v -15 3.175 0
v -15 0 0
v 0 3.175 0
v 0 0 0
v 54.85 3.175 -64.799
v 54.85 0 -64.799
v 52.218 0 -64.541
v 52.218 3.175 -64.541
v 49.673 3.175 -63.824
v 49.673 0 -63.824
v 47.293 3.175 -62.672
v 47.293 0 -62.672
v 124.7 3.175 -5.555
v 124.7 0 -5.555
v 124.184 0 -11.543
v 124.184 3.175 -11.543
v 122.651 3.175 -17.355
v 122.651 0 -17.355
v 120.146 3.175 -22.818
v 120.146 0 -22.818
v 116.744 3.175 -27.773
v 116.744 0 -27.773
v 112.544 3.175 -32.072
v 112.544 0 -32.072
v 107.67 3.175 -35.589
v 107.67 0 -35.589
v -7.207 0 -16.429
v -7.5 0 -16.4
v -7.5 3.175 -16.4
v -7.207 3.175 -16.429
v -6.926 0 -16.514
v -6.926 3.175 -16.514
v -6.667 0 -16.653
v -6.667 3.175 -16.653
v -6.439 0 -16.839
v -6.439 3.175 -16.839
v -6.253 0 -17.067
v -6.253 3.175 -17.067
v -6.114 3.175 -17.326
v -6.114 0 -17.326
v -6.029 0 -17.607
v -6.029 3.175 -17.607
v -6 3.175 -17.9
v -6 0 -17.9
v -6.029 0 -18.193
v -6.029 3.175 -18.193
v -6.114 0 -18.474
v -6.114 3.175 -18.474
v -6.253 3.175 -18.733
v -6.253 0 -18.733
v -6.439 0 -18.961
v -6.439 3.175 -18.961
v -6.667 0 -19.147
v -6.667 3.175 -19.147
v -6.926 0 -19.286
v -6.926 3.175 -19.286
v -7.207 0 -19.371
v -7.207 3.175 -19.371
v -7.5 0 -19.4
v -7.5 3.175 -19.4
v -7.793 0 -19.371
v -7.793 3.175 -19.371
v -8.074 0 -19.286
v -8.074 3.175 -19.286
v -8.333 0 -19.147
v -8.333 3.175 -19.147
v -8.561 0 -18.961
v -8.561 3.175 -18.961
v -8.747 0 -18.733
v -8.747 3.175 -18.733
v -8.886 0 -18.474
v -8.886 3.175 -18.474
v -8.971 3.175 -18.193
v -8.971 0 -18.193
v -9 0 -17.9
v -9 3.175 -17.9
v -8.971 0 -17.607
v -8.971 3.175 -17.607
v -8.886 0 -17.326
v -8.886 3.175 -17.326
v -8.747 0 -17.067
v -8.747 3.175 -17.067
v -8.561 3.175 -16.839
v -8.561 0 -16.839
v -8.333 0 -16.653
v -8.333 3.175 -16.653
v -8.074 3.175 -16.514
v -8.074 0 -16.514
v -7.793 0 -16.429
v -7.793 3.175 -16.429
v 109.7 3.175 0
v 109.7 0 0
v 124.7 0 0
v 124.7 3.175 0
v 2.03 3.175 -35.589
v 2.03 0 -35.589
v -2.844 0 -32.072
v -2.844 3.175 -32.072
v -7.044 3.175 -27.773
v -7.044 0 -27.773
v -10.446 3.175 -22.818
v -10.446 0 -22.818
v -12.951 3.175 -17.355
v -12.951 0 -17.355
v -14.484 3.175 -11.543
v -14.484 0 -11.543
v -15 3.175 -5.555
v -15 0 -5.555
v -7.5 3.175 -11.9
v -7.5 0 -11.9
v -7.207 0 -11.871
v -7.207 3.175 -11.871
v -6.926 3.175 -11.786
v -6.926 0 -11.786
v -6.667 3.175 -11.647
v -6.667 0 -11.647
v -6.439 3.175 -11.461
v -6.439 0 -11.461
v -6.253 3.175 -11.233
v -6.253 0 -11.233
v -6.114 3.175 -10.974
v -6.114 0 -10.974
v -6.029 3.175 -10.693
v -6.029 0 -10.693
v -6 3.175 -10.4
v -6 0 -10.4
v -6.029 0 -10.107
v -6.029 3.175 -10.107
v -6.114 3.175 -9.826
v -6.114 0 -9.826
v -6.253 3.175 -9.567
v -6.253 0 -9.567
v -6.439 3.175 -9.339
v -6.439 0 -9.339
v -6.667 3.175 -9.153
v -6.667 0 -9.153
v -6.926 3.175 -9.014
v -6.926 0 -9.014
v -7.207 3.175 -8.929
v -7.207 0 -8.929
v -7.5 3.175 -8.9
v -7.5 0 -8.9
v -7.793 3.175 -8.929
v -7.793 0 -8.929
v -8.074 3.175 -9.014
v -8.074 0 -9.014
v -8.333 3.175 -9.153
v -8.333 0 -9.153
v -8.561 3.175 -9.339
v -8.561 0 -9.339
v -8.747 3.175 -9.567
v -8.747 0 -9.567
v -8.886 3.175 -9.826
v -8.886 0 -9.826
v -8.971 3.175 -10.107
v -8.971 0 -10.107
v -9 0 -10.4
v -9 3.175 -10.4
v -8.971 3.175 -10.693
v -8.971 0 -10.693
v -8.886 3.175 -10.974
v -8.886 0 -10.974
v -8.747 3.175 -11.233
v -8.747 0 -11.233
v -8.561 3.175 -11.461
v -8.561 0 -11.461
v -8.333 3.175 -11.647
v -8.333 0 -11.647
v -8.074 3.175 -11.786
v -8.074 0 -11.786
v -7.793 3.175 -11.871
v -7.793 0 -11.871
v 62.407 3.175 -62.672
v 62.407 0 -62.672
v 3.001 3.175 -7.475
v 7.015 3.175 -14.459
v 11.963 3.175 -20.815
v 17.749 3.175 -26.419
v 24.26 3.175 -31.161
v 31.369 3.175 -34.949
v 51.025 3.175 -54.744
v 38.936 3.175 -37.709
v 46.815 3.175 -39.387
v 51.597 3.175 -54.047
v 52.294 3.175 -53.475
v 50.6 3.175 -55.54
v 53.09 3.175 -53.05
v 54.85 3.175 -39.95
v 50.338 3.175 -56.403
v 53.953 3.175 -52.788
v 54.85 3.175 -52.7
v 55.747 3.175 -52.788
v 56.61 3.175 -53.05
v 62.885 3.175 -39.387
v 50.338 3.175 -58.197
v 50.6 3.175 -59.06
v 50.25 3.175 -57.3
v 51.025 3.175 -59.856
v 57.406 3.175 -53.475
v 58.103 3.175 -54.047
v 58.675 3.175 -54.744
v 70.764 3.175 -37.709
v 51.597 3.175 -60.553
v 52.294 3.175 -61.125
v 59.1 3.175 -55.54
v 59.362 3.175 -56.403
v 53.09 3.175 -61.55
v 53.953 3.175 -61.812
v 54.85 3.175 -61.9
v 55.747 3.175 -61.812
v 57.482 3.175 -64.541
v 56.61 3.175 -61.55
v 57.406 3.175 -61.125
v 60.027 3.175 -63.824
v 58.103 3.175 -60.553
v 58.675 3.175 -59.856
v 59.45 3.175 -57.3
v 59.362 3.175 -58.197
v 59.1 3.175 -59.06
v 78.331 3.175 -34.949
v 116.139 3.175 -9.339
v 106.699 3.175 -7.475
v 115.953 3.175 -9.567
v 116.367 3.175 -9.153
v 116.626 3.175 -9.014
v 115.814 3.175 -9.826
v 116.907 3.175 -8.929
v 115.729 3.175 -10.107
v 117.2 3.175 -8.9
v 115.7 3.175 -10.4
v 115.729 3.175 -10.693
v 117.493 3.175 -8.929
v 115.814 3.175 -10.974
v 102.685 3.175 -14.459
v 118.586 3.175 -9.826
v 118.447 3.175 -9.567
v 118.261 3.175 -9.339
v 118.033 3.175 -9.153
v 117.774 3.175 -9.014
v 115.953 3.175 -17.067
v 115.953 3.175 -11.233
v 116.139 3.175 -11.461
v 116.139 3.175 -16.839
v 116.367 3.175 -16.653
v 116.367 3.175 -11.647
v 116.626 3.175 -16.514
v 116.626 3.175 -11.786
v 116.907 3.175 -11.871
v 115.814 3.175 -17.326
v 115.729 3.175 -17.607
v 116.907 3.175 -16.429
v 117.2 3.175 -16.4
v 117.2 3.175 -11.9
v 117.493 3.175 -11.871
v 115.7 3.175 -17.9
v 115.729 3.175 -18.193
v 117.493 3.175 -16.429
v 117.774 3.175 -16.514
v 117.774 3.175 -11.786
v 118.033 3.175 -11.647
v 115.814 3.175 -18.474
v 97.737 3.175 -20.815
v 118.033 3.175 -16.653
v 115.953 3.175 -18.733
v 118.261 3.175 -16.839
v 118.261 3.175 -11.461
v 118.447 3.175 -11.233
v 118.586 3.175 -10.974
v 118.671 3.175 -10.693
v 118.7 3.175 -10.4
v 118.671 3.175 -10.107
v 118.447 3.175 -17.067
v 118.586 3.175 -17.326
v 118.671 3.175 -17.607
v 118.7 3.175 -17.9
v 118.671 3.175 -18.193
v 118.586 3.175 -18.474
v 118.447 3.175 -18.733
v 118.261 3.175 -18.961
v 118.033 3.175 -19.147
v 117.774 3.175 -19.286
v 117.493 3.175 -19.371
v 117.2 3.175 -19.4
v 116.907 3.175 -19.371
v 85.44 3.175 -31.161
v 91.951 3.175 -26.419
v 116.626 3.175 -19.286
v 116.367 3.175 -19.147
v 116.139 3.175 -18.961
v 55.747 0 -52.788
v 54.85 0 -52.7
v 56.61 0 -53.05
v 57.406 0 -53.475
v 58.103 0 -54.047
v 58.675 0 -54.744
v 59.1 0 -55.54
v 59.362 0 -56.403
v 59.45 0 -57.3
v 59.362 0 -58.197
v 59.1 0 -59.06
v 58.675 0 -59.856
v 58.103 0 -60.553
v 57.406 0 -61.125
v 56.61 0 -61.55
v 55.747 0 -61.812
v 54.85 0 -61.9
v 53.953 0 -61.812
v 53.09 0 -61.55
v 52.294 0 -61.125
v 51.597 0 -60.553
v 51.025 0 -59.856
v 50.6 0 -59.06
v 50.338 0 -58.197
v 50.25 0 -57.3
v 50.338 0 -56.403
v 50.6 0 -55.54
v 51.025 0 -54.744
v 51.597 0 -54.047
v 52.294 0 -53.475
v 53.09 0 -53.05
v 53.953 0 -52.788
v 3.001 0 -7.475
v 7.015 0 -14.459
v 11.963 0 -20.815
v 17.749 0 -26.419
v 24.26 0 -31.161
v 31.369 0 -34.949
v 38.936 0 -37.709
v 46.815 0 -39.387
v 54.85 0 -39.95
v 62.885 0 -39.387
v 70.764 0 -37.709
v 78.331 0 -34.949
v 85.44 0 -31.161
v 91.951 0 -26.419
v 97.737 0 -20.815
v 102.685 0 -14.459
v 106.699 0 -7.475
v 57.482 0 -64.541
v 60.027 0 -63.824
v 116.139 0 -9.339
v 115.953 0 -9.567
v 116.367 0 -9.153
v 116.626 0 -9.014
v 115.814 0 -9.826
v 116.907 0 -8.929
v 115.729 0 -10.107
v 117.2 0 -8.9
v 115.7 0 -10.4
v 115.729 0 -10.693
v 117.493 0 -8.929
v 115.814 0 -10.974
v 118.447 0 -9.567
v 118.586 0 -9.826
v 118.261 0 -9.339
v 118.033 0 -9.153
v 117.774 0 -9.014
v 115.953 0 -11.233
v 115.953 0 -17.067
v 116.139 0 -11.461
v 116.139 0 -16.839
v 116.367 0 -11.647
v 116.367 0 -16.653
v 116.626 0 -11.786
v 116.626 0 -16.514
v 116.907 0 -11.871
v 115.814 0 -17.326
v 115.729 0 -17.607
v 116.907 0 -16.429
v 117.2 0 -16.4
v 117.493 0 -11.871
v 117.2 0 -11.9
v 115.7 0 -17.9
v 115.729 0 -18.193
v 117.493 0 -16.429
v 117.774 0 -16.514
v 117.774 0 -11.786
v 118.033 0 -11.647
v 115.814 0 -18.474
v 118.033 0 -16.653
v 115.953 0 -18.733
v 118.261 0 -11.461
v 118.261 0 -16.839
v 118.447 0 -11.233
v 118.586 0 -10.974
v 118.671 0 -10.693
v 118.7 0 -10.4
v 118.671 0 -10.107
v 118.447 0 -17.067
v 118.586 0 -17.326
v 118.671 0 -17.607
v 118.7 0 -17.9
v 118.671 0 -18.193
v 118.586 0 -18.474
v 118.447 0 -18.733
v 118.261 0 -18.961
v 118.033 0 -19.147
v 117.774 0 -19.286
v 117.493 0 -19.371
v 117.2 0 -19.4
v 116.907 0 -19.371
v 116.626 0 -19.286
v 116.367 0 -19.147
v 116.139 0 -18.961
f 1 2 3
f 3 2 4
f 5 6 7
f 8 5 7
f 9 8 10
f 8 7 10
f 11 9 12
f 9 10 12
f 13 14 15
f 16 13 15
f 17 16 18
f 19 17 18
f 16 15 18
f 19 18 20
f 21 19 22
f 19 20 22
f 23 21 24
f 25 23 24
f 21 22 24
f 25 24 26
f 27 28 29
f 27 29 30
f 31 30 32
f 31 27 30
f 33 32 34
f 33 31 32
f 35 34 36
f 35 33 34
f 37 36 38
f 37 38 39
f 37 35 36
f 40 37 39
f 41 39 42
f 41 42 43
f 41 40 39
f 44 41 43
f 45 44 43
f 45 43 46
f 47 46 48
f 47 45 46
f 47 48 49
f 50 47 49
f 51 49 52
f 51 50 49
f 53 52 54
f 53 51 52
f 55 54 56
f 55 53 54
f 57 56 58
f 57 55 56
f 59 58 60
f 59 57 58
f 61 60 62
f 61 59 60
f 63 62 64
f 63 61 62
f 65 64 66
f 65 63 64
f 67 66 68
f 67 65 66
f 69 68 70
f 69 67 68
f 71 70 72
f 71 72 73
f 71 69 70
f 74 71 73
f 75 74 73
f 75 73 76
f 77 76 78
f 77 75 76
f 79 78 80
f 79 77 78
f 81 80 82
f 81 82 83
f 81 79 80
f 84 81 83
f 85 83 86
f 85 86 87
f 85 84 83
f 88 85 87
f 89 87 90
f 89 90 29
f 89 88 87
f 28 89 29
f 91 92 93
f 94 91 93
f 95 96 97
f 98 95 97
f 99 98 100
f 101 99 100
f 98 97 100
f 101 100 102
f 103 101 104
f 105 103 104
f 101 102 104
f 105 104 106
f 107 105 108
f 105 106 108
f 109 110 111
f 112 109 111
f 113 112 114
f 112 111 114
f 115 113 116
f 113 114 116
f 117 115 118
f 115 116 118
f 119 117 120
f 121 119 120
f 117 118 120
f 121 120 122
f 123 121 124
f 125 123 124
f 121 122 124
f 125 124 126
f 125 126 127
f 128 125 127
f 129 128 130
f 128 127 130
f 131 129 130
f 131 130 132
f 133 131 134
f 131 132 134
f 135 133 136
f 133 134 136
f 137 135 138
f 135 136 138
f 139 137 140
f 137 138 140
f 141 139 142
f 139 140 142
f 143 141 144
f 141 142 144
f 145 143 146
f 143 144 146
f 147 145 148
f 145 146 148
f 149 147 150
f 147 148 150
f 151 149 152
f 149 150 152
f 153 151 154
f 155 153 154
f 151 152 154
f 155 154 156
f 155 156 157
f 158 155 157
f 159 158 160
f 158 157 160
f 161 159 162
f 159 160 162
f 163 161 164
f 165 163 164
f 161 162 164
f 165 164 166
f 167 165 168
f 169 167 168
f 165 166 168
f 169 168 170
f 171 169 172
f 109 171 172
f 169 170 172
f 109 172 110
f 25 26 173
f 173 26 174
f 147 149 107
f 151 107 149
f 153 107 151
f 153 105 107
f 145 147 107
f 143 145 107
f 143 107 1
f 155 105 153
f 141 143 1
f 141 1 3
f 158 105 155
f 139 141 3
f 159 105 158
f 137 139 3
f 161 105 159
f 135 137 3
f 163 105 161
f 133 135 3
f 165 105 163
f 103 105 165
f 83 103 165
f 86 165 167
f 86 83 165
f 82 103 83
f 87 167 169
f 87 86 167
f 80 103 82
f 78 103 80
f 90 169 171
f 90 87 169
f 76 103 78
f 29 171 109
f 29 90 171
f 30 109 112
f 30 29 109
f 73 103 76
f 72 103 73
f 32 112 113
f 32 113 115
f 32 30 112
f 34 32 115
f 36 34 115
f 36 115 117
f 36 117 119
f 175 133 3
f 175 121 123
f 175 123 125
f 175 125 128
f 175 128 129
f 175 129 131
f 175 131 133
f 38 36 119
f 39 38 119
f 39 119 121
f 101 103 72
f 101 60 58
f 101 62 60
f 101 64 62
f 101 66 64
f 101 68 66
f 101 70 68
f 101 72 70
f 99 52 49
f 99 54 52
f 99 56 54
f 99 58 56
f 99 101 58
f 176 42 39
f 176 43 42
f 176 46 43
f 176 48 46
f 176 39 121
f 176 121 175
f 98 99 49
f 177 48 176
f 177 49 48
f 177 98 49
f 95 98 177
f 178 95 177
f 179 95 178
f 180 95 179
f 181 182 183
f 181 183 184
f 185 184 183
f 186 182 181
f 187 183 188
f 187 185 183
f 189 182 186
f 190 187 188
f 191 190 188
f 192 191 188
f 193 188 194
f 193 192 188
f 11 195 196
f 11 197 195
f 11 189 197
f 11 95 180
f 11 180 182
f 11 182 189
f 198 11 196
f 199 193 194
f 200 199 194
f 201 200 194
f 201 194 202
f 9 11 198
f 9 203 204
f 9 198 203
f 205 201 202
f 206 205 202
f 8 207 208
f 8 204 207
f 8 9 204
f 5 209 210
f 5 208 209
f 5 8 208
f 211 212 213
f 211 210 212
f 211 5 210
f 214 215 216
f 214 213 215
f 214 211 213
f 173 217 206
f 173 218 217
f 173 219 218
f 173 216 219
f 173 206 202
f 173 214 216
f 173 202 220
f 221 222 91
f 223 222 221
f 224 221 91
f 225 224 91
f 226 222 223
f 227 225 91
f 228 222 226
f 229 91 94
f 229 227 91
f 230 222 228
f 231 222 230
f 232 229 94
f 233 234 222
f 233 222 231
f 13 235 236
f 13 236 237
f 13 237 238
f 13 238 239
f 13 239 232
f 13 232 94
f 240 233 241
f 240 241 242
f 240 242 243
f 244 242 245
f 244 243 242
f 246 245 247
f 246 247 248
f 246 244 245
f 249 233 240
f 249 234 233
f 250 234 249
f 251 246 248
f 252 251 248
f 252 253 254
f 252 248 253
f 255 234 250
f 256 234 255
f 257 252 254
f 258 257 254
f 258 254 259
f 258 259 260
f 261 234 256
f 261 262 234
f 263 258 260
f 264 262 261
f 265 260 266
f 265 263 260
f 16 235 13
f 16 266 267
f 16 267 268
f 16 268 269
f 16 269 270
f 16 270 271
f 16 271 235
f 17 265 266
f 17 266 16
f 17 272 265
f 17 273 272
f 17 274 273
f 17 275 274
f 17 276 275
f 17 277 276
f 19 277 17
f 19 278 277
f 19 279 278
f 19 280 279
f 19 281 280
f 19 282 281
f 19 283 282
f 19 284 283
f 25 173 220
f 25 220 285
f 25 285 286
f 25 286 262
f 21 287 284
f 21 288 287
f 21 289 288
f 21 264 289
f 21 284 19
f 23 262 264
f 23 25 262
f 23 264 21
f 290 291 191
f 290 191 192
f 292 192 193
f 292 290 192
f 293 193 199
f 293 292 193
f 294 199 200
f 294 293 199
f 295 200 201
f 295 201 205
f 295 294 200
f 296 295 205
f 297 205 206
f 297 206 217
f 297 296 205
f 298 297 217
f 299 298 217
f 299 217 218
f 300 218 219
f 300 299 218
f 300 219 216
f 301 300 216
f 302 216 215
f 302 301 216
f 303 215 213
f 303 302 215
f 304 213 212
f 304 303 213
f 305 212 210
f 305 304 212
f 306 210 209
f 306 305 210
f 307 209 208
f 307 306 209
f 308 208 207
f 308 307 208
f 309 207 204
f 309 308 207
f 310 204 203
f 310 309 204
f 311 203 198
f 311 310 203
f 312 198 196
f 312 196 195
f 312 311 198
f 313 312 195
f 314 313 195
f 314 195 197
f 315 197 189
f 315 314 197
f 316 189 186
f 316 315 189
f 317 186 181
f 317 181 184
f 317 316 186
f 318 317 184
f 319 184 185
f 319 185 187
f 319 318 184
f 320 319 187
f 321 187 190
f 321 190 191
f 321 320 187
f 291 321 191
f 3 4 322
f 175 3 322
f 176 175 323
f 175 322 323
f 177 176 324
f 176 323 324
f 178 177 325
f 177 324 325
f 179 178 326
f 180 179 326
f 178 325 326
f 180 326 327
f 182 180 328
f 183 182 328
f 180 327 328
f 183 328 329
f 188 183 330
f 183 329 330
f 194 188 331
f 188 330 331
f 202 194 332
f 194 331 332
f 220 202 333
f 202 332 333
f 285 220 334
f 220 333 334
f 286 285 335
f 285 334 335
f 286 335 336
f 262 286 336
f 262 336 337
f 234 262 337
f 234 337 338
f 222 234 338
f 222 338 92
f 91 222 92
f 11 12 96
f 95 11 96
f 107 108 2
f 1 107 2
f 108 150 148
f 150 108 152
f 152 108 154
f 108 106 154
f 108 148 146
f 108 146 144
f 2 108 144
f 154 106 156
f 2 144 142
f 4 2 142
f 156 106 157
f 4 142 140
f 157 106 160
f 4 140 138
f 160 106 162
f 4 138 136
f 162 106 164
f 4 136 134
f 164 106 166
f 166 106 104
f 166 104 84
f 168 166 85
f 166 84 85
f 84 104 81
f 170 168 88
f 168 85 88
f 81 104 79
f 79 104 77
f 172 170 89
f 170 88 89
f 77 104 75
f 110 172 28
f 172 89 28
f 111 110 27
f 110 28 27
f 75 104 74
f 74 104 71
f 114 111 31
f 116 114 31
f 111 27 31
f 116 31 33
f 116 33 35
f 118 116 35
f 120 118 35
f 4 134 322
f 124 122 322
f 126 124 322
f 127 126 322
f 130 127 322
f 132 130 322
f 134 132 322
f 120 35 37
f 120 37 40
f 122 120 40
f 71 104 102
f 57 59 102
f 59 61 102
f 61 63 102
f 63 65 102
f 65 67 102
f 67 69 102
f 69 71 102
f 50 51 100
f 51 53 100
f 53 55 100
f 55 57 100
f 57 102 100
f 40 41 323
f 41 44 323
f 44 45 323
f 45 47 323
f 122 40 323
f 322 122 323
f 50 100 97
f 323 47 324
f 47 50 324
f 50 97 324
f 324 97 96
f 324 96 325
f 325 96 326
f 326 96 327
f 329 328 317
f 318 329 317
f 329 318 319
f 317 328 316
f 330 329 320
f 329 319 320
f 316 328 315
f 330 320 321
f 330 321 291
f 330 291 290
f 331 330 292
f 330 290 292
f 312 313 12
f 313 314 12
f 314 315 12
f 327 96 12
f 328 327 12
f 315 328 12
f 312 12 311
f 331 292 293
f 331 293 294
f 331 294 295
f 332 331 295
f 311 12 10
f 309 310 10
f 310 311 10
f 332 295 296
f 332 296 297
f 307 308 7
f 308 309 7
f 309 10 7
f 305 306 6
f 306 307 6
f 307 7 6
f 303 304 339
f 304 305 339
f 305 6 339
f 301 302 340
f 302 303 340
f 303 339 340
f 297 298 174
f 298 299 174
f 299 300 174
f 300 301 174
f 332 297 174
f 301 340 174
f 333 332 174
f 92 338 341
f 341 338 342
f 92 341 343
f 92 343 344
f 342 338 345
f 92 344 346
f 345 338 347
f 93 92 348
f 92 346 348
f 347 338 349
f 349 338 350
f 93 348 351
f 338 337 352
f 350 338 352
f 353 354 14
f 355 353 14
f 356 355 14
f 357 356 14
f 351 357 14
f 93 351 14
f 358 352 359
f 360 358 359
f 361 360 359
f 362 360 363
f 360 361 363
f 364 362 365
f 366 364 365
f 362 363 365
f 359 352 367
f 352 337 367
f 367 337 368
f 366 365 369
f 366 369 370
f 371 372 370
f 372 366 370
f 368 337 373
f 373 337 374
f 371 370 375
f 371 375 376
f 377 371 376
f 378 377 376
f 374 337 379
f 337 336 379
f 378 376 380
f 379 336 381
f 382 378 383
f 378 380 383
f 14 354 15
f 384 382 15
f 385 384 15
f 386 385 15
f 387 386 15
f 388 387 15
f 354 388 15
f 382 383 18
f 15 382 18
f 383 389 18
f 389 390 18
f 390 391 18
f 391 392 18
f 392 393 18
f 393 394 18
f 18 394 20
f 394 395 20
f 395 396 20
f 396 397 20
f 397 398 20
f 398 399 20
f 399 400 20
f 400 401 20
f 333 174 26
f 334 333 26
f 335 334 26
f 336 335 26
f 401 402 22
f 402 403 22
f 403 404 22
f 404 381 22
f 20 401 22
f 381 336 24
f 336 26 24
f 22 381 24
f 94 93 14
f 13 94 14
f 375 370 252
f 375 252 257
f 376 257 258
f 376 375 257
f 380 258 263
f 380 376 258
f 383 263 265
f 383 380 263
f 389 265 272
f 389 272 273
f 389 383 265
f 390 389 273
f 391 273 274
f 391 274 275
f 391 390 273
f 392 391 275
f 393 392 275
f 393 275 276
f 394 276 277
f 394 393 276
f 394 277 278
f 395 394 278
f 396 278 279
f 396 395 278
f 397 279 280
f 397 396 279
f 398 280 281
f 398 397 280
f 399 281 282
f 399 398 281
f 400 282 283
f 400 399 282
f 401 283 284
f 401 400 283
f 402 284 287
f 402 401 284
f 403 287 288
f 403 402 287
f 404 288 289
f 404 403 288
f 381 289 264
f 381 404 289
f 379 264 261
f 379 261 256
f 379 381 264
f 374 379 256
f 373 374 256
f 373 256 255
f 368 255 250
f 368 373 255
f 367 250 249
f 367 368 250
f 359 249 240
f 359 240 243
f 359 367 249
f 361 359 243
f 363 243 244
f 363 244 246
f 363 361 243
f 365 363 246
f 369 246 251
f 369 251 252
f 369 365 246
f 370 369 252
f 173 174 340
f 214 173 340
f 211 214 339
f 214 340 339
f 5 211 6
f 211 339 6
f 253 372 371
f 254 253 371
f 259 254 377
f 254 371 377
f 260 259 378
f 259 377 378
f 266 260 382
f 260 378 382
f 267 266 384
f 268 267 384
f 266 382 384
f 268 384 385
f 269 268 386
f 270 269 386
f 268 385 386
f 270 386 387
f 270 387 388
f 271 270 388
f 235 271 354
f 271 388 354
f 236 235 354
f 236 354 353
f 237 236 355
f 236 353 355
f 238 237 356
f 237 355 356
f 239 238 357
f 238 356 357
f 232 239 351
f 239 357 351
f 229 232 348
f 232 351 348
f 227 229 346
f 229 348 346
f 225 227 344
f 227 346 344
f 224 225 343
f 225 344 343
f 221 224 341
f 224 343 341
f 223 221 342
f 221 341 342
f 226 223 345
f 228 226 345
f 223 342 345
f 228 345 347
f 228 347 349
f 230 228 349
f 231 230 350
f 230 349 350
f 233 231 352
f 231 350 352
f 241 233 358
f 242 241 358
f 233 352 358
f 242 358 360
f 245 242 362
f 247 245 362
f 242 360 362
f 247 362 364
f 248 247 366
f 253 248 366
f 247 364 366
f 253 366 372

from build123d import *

# Parameters (mm, degrees)
SKETCH1_R           = 4.6
SKETCH1_R_2         = 1.5
BOSS_EXTRUDE2_DEPTH = 3.175


with BuildPart() as part:
    # Sketch1 → Boss-Extrude2 (new body)
    with BuildSketch(Plane(origin=(0, 0, 0), x_dir=(1, 0, 0), z_dir=(0, 1, 0))):
        with BuildLine():
            Line((109.700000056, 0), (117.200000056, 0))
            Line((117.200000056, 0), (124.700000056, 0))
            Line((124.700000056, 0), (124.700000056, 5.554920326))
            ThreePointArc((124.700000056, 5.554920326), (120.146392707, 22.818094267), (107.670447225, 35.589284453))
            Line((107.670447225, 35.589284453), (62.40678526, 62.67187034))
            ThreePointArc((62.40678526, 62.67187034), (58.77003956, 64.238725538), (54.850000028, 64.799300745))
            ThreePointArc((54.850000028, 64.799300745), (50.929960496, 64.238725538), (47.293214796, 62.67187034))
            Line((47.293214796, 62.67187034), (2.029552831, 35.589284453))
            ThreePointArc((2.029552831, 35.589284453), (-10.446392651, 22.818094267), (-15, 5.554920326))
            Line((-15, 5.554920326), (-15, 0))
            Line((-15, 0), (-7.5, 0))
            Line((-7.5, 0), (0, 0))
            ThreePointArc((0, 0), (54.850000028, 39.949878845), (109.700000056, 0))
        make_face()
        with Locations(Location((54.850000028, 57.3, 0), (0, 0, 270))):
            Circle(SKETCH1_R, mode=Mode.SUBTRACT)
        with BuildLine():
            ThreePointArc((117.200000056, 8.9), (115.700000056, 10.4), (117.200000056, 11.9))
            ThreePointArc((117.200000056, 11.9), (118.700000056, 10.4), (117.200000056, 8.9))
        make_face(mode=Mode.SUBTRACT)
        with Locations(Location((117.200000056, 17.9, 0), (0, 0, 270))):
            Circle(SKETCH1_R_2, mode=Mode.SUBTRACT)
        with BuildLine():
            ThreePointArc((-7.5, 8.9), (-9, 10.4), (-7.5, 11.9))
            ThreePointArc((-7.5, 11.9), (-6, 10.4), (-7.5, 8.9))
        make_face(mode=Mode.SUBTRACT)
        with Locations(Location((-7.5, 17.9, 0), (0, 0, 270))):
            Circle(SKETCH1_R_2, mode=Mode.SUBTRACT)
    extrude(amount=BOSS_EXTRUDE2_DEPTH)


solid = part.part
